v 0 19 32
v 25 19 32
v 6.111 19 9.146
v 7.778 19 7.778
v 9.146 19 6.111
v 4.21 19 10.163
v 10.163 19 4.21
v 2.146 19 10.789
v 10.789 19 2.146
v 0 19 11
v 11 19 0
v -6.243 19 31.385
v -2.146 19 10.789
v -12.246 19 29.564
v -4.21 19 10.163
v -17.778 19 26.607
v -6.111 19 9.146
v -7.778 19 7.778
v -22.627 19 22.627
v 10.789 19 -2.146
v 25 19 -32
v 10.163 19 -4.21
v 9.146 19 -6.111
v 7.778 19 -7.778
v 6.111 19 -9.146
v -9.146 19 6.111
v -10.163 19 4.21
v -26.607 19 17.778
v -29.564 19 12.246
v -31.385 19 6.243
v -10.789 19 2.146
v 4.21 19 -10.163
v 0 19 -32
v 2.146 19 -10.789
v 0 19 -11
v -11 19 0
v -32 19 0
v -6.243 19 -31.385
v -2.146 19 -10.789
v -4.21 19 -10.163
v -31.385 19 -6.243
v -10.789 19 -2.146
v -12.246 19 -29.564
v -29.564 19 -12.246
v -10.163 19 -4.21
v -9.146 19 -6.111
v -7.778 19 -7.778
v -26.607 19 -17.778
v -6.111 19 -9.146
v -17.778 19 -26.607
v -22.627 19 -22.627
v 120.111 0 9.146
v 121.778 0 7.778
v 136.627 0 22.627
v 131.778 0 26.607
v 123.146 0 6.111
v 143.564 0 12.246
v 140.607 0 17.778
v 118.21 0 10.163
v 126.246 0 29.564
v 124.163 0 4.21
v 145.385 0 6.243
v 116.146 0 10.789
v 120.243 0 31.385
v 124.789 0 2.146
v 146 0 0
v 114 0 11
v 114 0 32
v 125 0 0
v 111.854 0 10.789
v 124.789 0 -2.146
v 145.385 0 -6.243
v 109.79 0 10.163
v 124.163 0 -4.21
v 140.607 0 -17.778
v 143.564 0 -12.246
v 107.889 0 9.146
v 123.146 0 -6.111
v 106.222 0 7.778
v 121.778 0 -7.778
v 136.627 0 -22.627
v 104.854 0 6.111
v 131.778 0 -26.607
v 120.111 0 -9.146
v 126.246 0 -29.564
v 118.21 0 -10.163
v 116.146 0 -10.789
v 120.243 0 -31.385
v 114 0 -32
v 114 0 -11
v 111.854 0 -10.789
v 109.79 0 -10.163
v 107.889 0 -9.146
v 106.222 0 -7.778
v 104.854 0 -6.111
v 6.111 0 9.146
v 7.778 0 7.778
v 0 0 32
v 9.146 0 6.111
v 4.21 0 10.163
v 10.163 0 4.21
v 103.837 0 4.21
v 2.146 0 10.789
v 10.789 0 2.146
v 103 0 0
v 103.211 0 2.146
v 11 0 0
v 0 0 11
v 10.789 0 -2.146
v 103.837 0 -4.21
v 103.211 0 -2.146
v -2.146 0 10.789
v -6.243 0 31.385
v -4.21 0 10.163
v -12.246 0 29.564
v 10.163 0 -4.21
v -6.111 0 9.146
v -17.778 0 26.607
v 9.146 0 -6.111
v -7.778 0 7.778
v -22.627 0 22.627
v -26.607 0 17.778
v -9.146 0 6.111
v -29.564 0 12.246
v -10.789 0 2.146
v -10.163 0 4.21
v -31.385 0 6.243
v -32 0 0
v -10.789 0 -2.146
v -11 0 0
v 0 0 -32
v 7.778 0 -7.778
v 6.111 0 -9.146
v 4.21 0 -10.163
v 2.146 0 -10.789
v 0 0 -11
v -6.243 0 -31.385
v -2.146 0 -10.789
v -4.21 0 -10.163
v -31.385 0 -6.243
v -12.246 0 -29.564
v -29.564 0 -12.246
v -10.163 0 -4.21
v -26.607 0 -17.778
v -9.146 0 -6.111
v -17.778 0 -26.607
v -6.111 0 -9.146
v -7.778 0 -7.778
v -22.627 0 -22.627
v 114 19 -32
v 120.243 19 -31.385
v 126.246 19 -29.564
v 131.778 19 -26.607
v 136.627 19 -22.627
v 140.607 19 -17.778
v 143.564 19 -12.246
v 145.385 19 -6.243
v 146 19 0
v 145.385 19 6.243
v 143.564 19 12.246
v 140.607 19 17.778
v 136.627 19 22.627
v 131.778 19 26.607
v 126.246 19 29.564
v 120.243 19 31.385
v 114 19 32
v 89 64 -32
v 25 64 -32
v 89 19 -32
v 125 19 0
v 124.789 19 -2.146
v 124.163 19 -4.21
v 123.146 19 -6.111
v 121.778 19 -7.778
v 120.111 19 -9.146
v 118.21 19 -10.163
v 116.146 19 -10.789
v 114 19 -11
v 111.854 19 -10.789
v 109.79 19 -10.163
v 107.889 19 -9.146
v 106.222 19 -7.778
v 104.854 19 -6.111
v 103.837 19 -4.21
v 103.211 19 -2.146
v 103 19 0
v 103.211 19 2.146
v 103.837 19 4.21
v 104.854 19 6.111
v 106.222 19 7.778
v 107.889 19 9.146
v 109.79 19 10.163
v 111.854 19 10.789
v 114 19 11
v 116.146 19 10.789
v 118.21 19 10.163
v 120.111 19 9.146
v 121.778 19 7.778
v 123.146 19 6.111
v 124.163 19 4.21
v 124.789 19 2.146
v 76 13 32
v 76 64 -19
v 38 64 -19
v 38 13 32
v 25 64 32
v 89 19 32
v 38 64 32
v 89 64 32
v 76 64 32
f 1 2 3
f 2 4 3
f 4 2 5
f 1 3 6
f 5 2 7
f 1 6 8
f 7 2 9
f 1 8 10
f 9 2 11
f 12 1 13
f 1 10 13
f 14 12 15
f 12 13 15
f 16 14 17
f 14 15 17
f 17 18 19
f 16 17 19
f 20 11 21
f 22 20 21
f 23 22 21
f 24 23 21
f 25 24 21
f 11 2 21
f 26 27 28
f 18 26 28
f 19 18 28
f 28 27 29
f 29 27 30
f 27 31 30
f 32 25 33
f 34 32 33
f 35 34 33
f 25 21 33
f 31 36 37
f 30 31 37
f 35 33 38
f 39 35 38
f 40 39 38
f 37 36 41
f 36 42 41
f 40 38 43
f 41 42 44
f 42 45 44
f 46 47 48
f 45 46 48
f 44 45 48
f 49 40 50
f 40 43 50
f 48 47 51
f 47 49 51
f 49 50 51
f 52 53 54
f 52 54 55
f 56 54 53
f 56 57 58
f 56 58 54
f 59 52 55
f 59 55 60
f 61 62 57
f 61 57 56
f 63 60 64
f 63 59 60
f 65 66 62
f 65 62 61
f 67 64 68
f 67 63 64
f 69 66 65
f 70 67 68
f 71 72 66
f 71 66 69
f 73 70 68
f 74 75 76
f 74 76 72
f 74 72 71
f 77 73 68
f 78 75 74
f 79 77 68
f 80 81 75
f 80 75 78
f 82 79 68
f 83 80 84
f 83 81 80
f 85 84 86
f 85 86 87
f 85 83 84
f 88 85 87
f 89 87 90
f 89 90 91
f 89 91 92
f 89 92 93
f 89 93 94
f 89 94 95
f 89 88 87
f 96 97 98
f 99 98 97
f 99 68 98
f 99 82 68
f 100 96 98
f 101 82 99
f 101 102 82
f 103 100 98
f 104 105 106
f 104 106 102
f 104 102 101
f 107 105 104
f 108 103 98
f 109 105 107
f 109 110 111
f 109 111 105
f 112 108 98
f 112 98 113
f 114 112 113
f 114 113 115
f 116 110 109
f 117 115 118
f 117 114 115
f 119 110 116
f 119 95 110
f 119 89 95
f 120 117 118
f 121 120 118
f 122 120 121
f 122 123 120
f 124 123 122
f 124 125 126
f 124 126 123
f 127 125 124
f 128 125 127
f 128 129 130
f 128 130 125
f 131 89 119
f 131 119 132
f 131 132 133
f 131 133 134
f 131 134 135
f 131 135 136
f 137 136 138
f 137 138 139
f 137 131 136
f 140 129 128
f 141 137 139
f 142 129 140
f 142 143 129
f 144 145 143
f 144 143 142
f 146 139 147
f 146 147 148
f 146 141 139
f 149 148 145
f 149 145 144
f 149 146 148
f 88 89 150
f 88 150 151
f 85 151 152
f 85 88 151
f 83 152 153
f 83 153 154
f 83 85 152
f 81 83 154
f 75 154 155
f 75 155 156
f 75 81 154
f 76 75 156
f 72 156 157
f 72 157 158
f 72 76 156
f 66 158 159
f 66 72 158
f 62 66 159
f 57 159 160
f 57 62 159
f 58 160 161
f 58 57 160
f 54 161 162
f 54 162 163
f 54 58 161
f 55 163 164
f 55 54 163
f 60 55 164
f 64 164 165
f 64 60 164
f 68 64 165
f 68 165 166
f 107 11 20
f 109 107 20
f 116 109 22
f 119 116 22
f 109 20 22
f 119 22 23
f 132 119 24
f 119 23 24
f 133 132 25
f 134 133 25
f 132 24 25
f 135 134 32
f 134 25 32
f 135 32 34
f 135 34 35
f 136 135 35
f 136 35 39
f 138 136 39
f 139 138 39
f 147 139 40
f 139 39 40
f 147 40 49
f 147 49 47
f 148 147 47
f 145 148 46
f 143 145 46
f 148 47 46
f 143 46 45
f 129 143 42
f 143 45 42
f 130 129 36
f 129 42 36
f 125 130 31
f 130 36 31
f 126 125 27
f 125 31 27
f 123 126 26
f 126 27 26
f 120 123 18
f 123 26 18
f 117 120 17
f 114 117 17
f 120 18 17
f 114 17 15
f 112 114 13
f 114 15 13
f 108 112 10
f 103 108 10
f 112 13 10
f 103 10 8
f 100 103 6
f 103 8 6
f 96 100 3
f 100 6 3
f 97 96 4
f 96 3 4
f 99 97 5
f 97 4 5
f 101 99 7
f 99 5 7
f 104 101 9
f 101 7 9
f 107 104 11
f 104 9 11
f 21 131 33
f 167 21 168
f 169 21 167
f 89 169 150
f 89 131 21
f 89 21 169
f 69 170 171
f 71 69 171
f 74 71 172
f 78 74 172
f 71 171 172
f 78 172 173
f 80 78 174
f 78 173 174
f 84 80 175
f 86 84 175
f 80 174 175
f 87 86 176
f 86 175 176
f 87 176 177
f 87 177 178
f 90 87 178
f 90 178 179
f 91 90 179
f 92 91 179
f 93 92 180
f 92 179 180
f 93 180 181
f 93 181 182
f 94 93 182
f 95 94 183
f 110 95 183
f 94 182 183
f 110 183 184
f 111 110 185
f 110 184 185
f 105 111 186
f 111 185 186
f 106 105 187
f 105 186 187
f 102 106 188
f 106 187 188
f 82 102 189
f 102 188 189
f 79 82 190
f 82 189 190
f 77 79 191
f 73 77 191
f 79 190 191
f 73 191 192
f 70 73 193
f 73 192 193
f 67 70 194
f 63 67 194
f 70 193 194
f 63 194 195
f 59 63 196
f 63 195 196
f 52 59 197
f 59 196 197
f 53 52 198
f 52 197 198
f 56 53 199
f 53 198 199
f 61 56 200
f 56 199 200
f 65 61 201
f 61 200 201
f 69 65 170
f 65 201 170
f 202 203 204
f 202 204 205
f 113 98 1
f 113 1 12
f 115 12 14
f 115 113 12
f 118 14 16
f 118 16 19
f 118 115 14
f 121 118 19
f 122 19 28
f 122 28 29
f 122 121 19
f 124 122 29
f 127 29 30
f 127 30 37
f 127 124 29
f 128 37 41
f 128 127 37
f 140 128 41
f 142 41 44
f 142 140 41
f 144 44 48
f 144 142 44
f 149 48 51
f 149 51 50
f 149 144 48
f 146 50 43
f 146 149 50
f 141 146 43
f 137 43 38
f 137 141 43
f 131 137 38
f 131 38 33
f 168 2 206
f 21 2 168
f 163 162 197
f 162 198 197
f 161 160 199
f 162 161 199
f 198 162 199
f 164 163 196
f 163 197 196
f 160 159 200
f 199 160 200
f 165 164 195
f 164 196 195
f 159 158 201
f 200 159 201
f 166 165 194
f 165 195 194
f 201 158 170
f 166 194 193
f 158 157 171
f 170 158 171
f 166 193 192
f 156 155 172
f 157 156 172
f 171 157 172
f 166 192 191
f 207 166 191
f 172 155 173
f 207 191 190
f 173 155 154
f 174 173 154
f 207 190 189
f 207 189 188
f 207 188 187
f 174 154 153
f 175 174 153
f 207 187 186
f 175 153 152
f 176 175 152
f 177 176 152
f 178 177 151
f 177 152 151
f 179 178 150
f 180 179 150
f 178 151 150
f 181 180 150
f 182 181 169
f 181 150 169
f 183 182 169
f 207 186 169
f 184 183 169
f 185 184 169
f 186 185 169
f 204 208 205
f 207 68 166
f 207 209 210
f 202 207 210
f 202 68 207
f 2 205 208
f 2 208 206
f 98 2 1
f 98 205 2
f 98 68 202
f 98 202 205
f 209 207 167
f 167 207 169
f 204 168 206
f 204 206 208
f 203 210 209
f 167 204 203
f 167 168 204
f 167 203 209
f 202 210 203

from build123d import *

# Parameters (mm, degrees)
BOSS_EXTRUDE1_DEPTH = 19
SKETCH2_R           = 11
CUT_EXTRUDE1_DEPTH  = 19
SKETCH3_W           = 64
SKETCH3_H           = 64
BOSS_EXTRUDE2_DEPTH = 45
SKETCH10_W          = 38
SKETCH10_H          = 51
CUT_EXTRUDE2_DEPTH  = 51
BOSS_EXTRUDE3_DEPTH = 38


with BuildPart() as part:
    # Sketch1 → Boss-Extrude1 (new body)
    with BuildSketch(Plane(origin=(0, 0, 0), x_dir=(1, 0, 0), z_dir=(0, 1, 0))):
        with BuildLine():
            Line((0, 32), (114, 32))
            ThreePointArc((114, 32), (146, 0), (114, -32))
            Line((114, -32), (0, -32))
            ThreePointArc((0, -32), (-32, 0), (0, 32))
        make_face()
    extrude(amount=BOSS_EXTRUDE1_DEPTH)

    # Sketch2 → Cut-Extrude1 (cut)
    with BuildSketch(Plane(origin=(0, 19, 0), x_dir=(1, 0, 0), z_dir=(0, 1, 0))):
        Circle(SKETCH2_R)
        with Locations((114, 0)):
            Circle(SKETCH2_R)
    extrude(amount=-CUT_EXTRUDE1_DEPTH, mode=Mode.SUBTRACT)

    # Sketch3 → Boss-Extrude2 (add)
    with BuildSketch(Plane(origin=(0, 19, 0), x_dir=(1, 0, 0), z_dir=(0, 1, 0))):
        with Locations((57, 0)):
            Rectangle(SKETCH3_W, SKETCH3_H)
    extrude(amount=BOSS_EXTRUDE2_DEPTH)

    # Sketch10 → Cut-Extrude2 (cut)
    with BuildSketch(Plane(origin=(0, 64, 0), x_dir=(1, 0, 0), z_dir=(0, 1, 0))):
        with Locations((57, -6.5)):
            Rectangle(SKETCH10_W, SKETCH10_H)
    extrude(amount=-CUT_EXTRUDE2_DEPTH, mode=Mode.SUBTRACT)

    # Sketch11 → Boss-Extrude3 (add)
    with BuildSketch(Plane.ZY.offset(-76)):
        Polygon((-19, 64), (32, 13), (-19, 13), align=None)
    extrude(amount=BOSS_EXTRUDE3_DEPTH)


solid = part.part
